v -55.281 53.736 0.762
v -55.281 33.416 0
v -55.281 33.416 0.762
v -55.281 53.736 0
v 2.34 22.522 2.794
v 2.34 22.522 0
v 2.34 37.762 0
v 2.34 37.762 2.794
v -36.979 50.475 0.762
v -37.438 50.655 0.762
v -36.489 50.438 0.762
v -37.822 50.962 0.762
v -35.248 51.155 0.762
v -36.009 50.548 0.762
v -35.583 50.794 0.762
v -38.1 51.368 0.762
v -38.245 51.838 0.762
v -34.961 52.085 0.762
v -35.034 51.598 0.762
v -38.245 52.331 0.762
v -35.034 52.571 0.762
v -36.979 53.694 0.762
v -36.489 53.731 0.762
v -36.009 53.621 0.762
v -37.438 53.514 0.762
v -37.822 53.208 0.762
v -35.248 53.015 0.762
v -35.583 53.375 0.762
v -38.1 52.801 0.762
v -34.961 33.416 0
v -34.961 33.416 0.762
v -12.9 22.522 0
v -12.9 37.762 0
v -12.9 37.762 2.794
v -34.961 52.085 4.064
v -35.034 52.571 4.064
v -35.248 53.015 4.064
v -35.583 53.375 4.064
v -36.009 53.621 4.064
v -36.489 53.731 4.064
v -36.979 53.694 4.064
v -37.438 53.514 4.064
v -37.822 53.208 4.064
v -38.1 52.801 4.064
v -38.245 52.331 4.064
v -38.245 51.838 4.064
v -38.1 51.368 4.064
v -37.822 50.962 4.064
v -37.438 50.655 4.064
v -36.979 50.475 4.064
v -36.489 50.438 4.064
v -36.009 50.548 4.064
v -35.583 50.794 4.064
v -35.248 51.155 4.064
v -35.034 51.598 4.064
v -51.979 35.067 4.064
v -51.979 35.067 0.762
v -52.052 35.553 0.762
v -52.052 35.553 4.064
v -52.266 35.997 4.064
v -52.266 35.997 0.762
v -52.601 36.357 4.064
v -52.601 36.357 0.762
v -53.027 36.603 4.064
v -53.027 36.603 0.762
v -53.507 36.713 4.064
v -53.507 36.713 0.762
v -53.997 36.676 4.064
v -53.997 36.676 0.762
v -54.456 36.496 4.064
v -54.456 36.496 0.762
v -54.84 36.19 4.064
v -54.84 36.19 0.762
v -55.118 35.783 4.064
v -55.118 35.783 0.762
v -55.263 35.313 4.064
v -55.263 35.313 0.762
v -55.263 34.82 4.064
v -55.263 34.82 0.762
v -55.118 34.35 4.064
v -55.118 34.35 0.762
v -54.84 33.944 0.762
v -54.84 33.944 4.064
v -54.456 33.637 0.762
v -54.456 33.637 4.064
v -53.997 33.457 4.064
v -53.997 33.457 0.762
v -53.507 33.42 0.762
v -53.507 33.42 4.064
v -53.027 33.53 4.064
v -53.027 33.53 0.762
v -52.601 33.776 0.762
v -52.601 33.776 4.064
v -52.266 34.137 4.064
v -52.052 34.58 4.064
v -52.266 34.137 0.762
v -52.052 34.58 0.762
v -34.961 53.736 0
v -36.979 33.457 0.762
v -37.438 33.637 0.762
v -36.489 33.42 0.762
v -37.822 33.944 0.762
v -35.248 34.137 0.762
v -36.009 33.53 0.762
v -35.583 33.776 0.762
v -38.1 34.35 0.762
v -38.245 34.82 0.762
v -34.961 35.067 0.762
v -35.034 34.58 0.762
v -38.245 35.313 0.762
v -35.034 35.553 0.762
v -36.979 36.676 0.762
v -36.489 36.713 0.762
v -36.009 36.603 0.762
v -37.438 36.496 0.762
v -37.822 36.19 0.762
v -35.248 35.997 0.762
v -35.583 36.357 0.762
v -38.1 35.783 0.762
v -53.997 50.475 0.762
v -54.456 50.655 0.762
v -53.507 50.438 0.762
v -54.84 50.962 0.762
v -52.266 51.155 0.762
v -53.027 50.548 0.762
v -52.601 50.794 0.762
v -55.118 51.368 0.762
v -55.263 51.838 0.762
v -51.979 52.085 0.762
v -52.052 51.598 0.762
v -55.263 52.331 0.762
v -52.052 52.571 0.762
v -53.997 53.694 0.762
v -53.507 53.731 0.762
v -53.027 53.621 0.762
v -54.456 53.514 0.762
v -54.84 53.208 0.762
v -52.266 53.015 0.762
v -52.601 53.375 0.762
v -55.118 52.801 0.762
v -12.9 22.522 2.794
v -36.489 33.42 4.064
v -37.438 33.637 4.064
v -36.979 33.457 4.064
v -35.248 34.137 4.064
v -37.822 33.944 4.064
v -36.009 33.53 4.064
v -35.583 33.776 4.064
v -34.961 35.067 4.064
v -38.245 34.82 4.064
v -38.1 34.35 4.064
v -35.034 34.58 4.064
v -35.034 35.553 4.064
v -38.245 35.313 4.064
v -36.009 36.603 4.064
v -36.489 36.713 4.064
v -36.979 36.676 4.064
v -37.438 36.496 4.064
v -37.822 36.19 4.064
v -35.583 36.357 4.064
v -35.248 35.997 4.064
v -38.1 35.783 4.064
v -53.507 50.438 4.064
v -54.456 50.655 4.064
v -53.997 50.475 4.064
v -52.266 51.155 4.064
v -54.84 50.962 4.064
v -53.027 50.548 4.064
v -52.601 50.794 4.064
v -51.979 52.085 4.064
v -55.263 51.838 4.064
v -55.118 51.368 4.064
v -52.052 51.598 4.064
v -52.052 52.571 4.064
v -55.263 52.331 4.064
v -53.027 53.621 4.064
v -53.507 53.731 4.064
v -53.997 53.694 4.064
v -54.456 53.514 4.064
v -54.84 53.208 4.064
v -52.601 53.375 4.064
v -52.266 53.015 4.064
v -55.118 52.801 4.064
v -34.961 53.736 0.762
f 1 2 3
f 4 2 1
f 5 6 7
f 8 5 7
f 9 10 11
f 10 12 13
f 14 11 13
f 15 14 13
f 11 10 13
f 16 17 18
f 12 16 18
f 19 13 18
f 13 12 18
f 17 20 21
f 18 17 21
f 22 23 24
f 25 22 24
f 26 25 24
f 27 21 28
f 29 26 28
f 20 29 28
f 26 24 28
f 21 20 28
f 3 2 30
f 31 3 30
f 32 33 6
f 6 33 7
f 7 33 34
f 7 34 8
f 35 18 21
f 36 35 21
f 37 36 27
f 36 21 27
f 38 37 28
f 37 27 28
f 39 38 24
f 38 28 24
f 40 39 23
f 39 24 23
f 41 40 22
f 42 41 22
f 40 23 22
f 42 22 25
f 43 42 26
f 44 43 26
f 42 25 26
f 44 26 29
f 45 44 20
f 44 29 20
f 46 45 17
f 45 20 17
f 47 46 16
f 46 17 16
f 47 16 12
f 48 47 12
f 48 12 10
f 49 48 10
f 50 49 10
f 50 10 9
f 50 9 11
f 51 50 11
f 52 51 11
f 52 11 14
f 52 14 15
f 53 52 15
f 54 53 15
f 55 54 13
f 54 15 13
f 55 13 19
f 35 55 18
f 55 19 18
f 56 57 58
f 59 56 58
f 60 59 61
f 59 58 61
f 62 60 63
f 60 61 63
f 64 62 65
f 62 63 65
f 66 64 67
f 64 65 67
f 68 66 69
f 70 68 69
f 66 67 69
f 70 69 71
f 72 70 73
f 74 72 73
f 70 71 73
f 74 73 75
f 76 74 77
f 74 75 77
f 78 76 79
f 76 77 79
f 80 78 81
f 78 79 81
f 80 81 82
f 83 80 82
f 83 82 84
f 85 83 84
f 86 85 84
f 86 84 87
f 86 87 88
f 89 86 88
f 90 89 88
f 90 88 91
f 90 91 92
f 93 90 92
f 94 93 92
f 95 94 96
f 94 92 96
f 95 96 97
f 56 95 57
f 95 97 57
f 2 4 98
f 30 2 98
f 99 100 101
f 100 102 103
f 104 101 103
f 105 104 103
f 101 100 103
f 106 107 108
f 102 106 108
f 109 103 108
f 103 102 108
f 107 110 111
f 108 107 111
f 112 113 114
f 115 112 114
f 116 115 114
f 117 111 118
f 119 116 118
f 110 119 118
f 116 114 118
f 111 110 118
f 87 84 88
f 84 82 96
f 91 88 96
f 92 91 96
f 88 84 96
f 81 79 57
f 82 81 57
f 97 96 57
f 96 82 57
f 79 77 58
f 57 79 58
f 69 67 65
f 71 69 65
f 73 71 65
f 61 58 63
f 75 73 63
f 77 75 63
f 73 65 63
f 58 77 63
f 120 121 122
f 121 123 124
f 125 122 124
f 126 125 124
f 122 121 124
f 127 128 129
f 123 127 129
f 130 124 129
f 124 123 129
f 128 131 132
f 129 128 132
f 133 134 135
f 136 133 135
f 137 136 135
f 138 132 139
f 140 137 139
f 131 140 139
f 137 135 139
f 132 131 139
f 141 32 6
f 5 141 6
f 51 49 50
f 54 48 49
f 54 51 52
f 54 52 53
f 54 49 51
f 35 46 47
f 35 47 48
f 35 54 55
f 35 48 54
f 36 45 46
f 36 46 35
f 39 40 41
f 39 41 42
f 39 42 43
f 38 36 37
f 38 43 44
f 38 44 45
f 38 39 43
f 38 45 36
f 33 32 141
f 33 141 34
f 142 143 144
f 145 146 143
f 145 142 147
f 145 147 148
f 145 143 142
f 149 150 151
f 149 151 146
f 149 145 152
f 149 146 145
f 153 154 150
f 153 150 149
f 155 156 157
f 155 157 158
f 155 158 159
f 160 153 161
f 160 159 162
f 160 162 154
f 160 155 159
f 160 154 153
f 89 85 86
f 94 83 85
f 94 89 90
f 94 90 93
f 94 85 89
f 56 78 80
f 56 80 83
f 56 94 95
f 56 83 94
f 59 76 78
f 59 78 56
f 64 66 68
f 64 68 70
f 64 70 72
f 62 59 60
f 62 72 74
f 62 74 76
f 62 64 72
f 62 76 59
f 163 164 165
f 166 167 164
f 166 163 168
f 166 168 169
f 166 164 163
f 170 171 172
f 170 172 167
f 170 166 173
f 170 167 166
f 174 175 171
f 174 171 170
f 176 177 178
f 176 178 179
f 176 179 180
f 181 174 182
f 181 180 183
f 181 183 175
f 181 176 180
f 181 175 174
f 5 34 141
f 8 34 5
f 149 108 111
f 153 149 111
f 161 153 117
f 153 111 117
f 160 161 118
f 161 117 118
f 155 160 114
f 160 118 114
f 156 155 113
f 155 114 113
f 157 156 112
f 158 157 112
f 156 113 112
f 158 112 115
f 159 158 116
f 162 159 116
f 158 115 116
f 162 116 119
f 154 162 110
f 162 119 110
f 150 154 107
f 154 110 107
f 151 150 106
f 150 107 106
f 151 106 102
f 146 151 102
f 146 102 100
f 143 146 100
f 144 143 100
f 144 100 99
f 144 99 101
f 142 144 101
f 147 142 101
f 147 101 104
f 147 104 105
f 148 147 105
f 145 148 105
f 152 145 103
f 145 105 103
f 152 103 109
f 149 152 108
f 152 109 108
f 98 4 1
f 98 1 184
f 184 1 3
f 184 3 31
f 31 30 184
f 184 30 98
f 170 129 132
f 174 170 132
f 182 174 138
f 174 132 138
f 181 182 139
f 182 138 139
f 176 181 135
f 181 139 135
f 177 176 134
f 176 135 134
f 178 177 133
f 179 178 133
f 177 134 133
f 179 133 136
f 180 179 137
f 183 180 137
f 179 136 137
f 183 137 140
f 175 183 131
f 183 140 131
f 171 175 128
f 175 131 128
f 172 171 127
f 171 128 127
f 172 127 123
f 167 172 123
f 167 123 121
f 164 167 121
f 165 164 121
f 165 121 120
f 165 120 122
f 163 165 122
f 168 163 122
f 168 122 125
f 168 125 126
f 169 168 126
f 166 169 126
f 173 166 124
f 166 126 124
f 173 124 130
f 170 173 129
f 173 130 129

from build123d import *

# Parameters (mm, degrees)
F0_W     = 20.32
F0_H     = 20.32
F1_DEPTH = 0.762
F2_R     = 1.651
F3_DEPTH = 3.302
F4_W     = 15.24
F4_H     = 15.24
F5_DEPTH = 2.794


with BuildPart() as f1:
    # F0 (on Top) → F1 (new body)
    with BuildSketch(Plane.XY):
        with Locations((-45.121097, 43.575563)):
            Rectangle(F0_W, F0_H)
    extrude(amount=F1_DEPTH)


with BuildPart() as f3:
    # F2 (on face) → F3 (new body)
    with BuildSketch(Plane.XY.offset(0.762)):
        with Locations((-36.612097, 52.084563)):
            Circle(F2_R)
        with Locations((-53.630097, 52.084563)):
            Circle(F2_R)
        with Locations((-53.630097, 35.066563)):
            Circle(F2_R)
        with Locations((-36.612097, 35.066563)):
            Circle(F2_R)
    extrude(amount=F3_DEPTH)


with BuildPart() as f5:
    # F4 (on Top) → F5 (new body)
    with BuildSketch(Plane.XY):
        with Locations((-5.279684, 30.141513)):
            Rectangle(F4_W, F4_H)
    extrude(amount=F5_DEPTH)


solid = Compound([f1.part, f3.part, f5.part])
